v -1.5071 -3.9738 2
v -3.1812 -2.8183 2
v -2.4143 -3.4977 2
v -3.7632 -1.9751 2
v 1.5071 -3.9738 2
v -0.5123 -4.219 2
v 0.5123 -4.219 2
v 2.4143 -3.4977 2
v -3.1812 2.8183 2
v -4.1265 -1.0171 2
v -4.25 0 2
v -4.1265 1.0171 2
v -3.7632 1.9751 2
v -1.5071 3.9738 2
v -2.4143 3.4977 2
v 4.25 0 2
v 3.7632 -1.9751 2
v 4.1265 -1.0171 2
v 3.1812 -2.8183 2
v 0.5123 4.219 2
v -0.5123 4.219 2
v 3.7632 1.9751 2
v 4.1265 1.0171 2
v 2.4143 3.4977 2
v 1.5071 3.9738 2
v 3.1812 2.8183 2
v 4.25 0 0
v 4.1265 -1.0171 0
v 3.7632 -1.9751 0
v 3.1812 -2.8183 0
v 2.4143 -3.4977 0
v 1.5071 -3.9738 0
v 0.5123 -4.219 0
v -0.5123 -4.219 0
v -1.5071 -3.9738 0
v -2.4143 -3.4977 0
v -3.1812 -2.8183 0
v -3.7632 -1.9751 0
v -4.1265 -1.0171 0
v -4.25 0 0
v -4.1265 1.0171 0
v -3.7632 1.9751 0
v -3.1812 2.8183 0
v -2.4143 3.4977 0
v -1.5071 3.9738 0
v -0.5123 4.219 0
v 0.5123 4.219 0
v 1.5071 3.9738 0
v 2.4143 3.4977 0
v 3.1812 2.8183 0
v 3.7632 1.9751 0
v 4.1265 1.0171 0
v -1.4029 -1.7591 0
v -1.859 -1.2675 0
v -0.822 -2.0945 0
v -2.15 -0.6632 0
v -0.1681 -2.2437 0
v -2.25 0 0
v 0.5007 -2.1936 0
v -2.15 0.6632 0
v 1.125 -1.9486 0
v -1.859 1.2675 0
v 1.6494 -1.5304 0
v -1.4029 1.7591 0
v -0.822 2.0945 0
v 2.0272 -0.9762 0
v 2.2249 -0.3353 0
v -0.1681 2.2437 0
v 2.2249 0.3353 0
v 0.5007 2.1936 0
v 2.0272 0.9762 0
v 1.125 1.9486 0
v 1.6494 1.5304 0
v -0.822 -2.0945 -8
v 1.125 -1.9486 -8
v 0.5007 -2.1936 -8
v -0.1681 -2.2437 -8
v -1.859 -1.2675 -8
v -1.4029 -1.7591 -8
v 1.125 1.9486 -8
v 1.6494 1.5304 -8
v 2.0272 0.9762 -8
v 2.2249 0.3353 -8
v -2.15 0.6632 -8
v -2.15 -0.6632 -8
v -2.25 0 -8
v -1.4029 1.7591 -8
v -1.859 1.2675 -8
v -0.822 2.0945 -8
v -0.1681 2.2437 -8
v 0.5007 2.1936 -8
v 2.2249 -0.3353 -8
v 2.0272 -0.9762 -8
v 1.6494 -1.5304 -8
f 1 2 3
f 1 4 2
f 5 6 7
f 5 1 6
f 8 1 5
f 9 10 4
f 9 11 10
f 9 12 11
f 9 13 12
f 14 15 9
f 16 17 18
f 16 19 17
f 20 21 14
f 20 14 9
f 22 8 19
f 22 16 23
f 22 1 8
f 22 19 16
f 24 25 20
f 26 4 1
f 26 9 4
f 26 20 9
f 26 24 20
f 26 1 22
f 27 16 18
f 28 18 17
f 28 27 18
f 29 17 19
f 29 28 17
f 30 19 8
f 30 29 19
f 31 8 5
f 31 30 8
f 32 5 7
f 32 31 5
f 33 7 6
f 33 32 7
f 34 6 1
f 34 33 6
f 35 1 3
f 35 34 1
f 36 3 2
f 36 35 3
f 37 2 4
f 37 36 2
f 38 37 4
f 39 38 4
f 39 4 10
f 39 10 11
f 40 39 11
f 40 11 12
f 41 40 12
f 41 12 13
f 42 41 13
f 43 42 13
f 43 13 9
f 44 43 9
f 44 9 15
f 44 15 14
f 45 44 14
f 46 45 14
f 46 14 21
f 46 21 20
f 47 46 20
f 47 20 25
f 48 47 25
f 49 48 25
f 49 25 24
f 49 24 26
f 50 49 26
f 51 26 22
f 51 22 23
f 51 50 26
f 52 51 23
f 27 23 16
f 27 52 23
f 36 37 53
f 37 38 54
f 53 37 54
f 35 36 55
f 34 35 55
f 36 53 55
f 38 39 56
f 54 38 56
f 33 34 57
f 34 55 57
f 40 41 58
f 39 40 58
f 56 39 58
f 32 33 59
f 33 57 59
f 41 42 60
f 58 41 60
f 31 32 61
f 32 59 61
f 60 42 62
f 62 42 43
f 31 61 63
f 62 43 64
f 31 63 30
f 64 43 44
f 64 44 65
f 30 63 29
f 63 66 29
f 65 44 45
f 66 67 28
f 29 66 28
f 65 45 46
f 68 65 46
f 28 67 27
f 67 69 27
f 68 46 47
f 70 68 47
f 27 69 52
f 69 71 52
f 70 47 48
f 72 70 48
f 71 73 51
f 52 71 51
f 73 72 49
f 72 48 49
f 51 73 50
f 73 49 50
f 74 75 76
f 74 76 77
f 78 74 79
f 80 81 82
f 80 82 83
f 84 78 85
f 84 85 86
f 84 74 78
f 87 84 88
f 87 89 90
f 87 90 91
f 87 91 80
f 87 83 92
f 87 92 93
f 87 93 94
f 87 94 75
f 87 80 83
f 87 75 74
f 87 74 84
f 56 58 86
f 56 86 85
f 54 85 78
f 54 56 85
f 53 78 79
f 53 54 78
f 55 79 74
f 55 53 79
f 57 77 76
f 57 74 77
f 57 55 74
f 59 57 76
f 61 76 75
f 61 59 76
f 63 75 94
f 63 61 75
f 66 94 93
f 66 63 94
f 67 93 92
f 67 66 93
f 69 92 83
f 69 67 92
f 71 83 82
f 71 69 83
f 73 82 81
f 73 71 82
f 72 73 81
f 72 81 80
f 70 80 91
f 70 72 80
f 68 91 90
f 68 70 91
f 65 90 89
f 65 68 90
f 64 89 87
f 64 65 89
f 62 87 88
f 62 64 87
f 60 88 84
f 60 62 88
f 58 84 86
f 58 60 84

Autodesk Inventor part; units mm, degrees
ref_plane "YZ Plane" through (0, 0, 0) normal (1, 0, 0) x (0, 1, 0)
ref_plane "XZ Plane" through (0, 0, 0) normal (0, 1, 0) x (-1, 0, 0)
ref_plane "XY Plane" through (0, 0, 0) normal (0, 0, 1) x (1, 0, 0)
sketch "Sketch1" plane through (0, 0, 0) normal (0, 0, 1) x (1, 0, 0)
  circle A0 centre (0, 0) radius 4.25
  dimension "d0" = 8.5
extrude "Extrusion1" add sketch "Sketch1" along normal blind 2
sketch "Sketch2" plane through (0, 0, 0) normal (0, 0, -1) x (-1, 0, 0)
  circle A0 centre (0, 0) radius 2.25
  dimension "d3" = 4.5
extrude "Extrusion2" add sketch "Sketch2" along normal blind 8
sketch "Sketch3" plane through (0, 0, 2) normal (0, 0, 1) x (1, 0, 0)
  circle A0 centre (0, 0) radius 2.25 projected
  circle A1 centre (0, 0) radius 4.25 projected
  line L0 (-4.25, 0) -> (-2.125, 3.6806)
  line L1 (-2.125, 3.6806) -> (2.125, 3.6806)
  line L2 (2.125, 3.6806) -> (4.25, 0)
  line L3 (4.25, 0) -> (2.125, -3.6806)
  line L4 (2.125, -3.6806) -> (-2.125, -3.6806)
  line L5 (-2.125, -3.6806) -> (-4.25, 0)
extrude "Extrusion3" add sketch "Sketch3" against normal blind 2 contours L2 A1 | A1 L3 | L1 A1 | A1 L4 | L0 A1 | A1 L5
thread "Thread2" size "M3x0.5" class "6g" standard "ANSI Metric M Profile" length 8
properties part number "vida"
